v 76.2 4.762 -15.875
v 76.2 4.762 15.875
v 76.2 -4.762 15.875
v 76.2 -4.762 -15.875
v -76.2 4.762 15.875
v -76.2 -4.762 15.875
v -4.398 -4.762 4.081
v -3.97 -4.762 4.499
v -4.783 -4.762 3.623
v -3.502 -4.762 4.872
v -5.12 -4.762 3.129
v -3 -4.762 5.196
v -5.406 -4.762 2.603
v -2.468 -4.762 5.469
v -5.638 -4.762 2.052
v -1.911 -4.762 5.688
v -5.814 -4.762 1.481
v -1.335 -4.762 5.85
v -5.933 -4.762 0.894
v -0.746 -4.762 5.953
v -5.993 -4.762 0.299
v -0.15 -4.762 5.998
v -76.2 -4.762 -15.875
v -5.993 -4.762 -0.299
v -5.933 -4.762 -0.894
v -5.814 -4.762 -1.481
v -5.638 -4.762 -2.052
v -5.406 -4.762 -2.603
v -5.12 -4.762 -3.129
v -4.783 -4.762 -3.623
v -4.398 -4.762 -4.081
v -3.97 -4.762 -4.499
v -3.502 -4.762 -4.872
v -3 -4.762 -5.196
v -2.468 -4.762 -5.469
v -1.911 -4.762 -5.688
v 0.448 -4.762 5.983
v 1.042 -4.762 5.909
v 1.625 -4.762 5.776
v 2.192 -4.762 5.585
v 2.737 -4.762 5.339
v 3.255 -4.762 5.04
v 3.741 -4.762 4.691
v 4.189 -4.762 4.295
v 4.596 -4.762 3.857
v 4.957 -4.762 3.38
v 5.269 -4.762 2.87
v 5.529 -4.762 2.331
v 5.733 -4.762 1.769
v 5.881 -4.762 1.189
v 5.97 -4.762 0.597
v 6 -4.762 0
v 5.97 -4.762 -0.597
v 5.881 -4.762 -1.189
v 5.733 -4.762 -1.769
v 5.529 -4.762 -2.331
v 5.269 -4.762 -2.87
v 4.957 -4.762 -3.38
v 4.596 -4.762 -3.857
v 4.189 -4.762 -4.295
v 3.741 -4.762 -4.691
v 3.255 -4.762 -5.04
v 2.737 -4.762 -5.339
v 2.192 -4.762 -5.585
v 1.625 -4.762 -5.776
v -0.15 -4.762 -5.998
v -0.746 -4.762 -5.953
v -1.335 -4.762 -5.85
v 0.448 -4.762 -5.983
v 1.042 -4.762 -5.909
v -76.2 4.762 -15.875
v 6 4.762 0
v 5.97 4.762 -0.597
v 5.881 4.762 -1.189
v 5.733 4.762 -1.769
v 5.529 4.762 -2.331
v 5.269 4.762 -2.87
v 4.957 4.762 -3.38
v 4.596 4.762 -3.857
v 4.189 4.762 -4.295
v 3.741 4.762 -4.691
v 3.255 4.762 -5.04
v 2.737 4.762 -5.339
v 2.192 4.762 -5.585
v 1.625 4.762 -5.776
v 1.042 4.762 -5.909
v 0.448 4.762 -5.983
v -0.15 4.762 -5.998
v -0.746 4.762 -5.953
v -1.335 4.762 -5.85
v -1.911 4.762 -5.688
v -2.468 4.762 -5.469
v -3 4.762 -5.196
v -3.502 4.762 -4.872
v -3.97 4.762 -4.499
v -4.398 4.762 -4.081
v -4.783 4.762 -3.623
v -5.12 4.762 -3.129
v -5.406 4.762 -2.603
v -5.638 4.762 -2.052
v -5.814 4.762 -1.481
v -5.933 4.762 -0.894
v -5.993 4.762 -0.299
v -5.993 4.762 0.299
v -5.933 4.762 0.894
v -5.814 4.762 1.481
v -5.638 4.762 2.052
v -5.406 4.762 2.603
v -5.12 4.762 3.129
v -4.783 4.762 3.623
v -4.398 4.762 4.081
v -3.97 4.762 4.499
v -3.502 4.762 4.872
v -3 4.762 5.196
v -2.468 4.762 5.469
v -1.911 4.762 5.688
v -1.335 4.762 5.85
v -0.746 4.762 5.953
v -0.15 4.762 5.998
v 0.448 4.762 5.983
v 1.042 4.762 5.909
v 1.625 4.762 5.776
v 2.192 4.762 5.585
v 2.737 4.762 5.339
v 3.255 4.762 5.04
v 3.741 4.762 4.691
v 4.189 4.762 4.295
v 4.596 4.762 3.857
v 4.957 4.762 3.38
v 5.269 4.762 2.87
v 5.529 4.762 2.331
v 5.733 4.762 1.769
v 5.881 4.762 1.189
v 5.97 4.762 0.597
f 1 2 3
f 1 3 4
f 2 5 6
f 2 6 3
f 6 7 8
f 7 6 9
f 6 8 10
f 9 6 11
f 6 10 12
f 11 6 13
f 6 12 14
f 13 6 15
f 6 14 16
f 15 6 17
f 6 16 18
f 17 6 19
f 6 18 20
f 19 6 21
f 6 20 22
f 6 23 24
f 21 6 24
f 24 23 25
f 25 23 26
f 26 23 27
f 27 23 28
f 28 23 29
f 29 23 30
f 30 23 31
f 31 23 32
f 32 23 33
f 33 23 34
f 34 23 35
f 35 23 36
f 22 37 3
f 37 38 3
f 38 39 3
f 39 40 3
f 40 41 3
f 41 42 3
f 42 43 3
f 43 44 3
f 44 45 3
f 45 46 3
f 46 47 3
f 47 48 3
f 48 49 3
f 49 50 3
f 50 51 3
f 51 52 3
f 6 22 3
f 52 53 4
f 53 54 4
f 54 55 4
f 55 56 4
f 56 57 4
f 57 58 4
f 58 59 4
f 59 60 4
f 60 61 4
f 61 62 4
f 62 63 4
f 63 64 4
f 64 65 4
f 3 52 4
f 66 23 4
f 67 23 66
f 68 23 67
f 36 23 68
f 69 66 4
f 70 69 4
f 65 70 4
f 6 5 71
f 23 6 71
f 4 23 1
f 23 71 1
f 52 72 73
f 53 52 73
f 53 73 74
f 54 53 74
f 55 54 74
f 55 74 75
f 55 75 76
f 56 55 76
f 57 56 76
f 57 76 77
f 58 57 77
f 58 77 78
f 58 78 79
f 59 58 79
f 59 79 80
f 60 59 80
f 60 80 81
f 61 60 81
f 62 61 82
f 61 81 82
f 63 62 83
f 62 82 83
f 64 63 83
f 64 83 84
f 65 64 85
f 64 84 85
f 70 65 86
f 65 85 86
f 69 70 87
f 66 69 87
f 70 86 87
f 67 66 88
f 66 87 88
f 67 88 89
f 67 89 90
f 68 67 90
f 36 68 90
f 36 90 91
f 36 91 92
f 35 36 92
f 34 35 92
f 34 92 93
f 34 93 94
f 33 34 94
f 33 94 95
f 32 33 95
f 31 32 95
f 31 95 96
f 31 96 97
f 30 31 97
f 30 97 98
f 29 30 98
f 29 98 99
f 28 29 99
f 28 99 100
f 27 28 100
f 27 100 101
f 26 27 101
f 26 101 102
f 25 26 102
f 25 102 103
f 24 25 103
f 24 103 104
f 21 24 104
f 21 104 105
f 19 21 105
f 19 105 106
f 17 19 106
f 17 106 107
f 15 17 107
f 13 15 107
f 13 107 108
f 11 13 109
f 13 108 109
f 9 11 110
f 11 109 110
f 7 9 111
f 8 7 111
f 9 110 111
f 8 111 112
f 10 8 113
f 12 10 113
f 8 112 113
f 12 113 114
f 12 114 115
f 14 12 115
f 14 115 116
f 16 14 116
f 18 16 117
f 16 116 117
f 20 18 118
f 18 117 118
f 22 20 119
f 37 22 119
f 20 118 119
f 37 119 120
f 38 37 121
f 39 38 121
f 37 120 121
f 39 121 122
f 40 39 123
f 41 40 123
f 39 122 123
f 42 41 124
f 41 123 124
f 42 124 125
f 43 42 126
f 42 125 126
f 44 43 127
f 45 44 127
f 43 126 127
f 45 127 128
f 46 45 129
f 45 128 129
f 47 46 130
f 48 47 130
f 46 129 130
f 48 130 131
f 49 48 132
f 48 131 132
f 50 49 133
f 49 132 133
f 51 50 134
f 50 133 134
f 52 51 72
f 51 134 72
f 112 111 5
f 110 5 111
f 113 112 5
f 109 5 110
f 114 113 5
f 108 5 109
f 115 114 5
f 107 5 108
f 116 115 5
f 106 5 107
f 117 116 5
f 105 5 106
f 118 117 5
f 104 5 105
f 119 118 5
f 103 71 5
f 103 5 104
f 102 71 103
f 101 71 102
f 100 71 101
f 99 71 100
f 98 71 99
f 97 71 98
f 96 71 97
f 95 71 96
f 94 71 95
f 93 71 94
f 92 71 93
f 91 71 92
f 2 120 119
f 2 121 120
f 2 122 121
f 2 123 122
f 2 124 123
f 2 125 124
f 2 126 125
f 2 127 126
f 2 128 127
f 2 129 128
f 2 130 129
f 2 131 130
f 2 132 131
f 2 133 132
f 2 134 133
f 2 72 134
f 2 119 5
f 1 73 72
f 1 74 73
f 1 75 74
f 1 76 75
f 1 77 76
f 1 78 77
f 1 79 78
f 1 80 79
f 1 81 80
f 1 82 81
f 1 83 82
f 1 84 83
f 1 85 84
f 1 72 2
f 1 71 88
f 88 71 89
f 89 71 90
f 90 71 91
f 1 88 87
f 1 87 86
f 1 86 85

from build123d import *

# Parameters (mm, degrees)
SKETCH1_W              = 152.4
SKETCH1_H              = 31.75
BOSS_EXTRUDE1_DEPTH    = 4.7625
F_12_0MM_DOWEL_HOLE1_D = 12


with BuildPart() as part:
    # Sketch1 → Boss-Extrude1 (new, symmetric)
    with BuildSketch(Plane(origin=(0, 0, 0), x_dir=(1, 0, 0), z_dir=(0, 1, 0))):
        Rectangle(SKETCH1_W, SKETCH1_H)
    extrude(amount=BOSS_EXTRUDE1_DEPTH, both=True)

    # Ø12.0mm Dowel Hole1 (through all)
    with Locations(Plane(origin=(0, -4.7625, 0), x_dir=(-1, 0, 0), z_dir=(0, -1, 0))):
        with Locations((0, 0)):
            Hole(F_12_0MM_DOWEL_HOLE1_D / 2)


solid = part.part
